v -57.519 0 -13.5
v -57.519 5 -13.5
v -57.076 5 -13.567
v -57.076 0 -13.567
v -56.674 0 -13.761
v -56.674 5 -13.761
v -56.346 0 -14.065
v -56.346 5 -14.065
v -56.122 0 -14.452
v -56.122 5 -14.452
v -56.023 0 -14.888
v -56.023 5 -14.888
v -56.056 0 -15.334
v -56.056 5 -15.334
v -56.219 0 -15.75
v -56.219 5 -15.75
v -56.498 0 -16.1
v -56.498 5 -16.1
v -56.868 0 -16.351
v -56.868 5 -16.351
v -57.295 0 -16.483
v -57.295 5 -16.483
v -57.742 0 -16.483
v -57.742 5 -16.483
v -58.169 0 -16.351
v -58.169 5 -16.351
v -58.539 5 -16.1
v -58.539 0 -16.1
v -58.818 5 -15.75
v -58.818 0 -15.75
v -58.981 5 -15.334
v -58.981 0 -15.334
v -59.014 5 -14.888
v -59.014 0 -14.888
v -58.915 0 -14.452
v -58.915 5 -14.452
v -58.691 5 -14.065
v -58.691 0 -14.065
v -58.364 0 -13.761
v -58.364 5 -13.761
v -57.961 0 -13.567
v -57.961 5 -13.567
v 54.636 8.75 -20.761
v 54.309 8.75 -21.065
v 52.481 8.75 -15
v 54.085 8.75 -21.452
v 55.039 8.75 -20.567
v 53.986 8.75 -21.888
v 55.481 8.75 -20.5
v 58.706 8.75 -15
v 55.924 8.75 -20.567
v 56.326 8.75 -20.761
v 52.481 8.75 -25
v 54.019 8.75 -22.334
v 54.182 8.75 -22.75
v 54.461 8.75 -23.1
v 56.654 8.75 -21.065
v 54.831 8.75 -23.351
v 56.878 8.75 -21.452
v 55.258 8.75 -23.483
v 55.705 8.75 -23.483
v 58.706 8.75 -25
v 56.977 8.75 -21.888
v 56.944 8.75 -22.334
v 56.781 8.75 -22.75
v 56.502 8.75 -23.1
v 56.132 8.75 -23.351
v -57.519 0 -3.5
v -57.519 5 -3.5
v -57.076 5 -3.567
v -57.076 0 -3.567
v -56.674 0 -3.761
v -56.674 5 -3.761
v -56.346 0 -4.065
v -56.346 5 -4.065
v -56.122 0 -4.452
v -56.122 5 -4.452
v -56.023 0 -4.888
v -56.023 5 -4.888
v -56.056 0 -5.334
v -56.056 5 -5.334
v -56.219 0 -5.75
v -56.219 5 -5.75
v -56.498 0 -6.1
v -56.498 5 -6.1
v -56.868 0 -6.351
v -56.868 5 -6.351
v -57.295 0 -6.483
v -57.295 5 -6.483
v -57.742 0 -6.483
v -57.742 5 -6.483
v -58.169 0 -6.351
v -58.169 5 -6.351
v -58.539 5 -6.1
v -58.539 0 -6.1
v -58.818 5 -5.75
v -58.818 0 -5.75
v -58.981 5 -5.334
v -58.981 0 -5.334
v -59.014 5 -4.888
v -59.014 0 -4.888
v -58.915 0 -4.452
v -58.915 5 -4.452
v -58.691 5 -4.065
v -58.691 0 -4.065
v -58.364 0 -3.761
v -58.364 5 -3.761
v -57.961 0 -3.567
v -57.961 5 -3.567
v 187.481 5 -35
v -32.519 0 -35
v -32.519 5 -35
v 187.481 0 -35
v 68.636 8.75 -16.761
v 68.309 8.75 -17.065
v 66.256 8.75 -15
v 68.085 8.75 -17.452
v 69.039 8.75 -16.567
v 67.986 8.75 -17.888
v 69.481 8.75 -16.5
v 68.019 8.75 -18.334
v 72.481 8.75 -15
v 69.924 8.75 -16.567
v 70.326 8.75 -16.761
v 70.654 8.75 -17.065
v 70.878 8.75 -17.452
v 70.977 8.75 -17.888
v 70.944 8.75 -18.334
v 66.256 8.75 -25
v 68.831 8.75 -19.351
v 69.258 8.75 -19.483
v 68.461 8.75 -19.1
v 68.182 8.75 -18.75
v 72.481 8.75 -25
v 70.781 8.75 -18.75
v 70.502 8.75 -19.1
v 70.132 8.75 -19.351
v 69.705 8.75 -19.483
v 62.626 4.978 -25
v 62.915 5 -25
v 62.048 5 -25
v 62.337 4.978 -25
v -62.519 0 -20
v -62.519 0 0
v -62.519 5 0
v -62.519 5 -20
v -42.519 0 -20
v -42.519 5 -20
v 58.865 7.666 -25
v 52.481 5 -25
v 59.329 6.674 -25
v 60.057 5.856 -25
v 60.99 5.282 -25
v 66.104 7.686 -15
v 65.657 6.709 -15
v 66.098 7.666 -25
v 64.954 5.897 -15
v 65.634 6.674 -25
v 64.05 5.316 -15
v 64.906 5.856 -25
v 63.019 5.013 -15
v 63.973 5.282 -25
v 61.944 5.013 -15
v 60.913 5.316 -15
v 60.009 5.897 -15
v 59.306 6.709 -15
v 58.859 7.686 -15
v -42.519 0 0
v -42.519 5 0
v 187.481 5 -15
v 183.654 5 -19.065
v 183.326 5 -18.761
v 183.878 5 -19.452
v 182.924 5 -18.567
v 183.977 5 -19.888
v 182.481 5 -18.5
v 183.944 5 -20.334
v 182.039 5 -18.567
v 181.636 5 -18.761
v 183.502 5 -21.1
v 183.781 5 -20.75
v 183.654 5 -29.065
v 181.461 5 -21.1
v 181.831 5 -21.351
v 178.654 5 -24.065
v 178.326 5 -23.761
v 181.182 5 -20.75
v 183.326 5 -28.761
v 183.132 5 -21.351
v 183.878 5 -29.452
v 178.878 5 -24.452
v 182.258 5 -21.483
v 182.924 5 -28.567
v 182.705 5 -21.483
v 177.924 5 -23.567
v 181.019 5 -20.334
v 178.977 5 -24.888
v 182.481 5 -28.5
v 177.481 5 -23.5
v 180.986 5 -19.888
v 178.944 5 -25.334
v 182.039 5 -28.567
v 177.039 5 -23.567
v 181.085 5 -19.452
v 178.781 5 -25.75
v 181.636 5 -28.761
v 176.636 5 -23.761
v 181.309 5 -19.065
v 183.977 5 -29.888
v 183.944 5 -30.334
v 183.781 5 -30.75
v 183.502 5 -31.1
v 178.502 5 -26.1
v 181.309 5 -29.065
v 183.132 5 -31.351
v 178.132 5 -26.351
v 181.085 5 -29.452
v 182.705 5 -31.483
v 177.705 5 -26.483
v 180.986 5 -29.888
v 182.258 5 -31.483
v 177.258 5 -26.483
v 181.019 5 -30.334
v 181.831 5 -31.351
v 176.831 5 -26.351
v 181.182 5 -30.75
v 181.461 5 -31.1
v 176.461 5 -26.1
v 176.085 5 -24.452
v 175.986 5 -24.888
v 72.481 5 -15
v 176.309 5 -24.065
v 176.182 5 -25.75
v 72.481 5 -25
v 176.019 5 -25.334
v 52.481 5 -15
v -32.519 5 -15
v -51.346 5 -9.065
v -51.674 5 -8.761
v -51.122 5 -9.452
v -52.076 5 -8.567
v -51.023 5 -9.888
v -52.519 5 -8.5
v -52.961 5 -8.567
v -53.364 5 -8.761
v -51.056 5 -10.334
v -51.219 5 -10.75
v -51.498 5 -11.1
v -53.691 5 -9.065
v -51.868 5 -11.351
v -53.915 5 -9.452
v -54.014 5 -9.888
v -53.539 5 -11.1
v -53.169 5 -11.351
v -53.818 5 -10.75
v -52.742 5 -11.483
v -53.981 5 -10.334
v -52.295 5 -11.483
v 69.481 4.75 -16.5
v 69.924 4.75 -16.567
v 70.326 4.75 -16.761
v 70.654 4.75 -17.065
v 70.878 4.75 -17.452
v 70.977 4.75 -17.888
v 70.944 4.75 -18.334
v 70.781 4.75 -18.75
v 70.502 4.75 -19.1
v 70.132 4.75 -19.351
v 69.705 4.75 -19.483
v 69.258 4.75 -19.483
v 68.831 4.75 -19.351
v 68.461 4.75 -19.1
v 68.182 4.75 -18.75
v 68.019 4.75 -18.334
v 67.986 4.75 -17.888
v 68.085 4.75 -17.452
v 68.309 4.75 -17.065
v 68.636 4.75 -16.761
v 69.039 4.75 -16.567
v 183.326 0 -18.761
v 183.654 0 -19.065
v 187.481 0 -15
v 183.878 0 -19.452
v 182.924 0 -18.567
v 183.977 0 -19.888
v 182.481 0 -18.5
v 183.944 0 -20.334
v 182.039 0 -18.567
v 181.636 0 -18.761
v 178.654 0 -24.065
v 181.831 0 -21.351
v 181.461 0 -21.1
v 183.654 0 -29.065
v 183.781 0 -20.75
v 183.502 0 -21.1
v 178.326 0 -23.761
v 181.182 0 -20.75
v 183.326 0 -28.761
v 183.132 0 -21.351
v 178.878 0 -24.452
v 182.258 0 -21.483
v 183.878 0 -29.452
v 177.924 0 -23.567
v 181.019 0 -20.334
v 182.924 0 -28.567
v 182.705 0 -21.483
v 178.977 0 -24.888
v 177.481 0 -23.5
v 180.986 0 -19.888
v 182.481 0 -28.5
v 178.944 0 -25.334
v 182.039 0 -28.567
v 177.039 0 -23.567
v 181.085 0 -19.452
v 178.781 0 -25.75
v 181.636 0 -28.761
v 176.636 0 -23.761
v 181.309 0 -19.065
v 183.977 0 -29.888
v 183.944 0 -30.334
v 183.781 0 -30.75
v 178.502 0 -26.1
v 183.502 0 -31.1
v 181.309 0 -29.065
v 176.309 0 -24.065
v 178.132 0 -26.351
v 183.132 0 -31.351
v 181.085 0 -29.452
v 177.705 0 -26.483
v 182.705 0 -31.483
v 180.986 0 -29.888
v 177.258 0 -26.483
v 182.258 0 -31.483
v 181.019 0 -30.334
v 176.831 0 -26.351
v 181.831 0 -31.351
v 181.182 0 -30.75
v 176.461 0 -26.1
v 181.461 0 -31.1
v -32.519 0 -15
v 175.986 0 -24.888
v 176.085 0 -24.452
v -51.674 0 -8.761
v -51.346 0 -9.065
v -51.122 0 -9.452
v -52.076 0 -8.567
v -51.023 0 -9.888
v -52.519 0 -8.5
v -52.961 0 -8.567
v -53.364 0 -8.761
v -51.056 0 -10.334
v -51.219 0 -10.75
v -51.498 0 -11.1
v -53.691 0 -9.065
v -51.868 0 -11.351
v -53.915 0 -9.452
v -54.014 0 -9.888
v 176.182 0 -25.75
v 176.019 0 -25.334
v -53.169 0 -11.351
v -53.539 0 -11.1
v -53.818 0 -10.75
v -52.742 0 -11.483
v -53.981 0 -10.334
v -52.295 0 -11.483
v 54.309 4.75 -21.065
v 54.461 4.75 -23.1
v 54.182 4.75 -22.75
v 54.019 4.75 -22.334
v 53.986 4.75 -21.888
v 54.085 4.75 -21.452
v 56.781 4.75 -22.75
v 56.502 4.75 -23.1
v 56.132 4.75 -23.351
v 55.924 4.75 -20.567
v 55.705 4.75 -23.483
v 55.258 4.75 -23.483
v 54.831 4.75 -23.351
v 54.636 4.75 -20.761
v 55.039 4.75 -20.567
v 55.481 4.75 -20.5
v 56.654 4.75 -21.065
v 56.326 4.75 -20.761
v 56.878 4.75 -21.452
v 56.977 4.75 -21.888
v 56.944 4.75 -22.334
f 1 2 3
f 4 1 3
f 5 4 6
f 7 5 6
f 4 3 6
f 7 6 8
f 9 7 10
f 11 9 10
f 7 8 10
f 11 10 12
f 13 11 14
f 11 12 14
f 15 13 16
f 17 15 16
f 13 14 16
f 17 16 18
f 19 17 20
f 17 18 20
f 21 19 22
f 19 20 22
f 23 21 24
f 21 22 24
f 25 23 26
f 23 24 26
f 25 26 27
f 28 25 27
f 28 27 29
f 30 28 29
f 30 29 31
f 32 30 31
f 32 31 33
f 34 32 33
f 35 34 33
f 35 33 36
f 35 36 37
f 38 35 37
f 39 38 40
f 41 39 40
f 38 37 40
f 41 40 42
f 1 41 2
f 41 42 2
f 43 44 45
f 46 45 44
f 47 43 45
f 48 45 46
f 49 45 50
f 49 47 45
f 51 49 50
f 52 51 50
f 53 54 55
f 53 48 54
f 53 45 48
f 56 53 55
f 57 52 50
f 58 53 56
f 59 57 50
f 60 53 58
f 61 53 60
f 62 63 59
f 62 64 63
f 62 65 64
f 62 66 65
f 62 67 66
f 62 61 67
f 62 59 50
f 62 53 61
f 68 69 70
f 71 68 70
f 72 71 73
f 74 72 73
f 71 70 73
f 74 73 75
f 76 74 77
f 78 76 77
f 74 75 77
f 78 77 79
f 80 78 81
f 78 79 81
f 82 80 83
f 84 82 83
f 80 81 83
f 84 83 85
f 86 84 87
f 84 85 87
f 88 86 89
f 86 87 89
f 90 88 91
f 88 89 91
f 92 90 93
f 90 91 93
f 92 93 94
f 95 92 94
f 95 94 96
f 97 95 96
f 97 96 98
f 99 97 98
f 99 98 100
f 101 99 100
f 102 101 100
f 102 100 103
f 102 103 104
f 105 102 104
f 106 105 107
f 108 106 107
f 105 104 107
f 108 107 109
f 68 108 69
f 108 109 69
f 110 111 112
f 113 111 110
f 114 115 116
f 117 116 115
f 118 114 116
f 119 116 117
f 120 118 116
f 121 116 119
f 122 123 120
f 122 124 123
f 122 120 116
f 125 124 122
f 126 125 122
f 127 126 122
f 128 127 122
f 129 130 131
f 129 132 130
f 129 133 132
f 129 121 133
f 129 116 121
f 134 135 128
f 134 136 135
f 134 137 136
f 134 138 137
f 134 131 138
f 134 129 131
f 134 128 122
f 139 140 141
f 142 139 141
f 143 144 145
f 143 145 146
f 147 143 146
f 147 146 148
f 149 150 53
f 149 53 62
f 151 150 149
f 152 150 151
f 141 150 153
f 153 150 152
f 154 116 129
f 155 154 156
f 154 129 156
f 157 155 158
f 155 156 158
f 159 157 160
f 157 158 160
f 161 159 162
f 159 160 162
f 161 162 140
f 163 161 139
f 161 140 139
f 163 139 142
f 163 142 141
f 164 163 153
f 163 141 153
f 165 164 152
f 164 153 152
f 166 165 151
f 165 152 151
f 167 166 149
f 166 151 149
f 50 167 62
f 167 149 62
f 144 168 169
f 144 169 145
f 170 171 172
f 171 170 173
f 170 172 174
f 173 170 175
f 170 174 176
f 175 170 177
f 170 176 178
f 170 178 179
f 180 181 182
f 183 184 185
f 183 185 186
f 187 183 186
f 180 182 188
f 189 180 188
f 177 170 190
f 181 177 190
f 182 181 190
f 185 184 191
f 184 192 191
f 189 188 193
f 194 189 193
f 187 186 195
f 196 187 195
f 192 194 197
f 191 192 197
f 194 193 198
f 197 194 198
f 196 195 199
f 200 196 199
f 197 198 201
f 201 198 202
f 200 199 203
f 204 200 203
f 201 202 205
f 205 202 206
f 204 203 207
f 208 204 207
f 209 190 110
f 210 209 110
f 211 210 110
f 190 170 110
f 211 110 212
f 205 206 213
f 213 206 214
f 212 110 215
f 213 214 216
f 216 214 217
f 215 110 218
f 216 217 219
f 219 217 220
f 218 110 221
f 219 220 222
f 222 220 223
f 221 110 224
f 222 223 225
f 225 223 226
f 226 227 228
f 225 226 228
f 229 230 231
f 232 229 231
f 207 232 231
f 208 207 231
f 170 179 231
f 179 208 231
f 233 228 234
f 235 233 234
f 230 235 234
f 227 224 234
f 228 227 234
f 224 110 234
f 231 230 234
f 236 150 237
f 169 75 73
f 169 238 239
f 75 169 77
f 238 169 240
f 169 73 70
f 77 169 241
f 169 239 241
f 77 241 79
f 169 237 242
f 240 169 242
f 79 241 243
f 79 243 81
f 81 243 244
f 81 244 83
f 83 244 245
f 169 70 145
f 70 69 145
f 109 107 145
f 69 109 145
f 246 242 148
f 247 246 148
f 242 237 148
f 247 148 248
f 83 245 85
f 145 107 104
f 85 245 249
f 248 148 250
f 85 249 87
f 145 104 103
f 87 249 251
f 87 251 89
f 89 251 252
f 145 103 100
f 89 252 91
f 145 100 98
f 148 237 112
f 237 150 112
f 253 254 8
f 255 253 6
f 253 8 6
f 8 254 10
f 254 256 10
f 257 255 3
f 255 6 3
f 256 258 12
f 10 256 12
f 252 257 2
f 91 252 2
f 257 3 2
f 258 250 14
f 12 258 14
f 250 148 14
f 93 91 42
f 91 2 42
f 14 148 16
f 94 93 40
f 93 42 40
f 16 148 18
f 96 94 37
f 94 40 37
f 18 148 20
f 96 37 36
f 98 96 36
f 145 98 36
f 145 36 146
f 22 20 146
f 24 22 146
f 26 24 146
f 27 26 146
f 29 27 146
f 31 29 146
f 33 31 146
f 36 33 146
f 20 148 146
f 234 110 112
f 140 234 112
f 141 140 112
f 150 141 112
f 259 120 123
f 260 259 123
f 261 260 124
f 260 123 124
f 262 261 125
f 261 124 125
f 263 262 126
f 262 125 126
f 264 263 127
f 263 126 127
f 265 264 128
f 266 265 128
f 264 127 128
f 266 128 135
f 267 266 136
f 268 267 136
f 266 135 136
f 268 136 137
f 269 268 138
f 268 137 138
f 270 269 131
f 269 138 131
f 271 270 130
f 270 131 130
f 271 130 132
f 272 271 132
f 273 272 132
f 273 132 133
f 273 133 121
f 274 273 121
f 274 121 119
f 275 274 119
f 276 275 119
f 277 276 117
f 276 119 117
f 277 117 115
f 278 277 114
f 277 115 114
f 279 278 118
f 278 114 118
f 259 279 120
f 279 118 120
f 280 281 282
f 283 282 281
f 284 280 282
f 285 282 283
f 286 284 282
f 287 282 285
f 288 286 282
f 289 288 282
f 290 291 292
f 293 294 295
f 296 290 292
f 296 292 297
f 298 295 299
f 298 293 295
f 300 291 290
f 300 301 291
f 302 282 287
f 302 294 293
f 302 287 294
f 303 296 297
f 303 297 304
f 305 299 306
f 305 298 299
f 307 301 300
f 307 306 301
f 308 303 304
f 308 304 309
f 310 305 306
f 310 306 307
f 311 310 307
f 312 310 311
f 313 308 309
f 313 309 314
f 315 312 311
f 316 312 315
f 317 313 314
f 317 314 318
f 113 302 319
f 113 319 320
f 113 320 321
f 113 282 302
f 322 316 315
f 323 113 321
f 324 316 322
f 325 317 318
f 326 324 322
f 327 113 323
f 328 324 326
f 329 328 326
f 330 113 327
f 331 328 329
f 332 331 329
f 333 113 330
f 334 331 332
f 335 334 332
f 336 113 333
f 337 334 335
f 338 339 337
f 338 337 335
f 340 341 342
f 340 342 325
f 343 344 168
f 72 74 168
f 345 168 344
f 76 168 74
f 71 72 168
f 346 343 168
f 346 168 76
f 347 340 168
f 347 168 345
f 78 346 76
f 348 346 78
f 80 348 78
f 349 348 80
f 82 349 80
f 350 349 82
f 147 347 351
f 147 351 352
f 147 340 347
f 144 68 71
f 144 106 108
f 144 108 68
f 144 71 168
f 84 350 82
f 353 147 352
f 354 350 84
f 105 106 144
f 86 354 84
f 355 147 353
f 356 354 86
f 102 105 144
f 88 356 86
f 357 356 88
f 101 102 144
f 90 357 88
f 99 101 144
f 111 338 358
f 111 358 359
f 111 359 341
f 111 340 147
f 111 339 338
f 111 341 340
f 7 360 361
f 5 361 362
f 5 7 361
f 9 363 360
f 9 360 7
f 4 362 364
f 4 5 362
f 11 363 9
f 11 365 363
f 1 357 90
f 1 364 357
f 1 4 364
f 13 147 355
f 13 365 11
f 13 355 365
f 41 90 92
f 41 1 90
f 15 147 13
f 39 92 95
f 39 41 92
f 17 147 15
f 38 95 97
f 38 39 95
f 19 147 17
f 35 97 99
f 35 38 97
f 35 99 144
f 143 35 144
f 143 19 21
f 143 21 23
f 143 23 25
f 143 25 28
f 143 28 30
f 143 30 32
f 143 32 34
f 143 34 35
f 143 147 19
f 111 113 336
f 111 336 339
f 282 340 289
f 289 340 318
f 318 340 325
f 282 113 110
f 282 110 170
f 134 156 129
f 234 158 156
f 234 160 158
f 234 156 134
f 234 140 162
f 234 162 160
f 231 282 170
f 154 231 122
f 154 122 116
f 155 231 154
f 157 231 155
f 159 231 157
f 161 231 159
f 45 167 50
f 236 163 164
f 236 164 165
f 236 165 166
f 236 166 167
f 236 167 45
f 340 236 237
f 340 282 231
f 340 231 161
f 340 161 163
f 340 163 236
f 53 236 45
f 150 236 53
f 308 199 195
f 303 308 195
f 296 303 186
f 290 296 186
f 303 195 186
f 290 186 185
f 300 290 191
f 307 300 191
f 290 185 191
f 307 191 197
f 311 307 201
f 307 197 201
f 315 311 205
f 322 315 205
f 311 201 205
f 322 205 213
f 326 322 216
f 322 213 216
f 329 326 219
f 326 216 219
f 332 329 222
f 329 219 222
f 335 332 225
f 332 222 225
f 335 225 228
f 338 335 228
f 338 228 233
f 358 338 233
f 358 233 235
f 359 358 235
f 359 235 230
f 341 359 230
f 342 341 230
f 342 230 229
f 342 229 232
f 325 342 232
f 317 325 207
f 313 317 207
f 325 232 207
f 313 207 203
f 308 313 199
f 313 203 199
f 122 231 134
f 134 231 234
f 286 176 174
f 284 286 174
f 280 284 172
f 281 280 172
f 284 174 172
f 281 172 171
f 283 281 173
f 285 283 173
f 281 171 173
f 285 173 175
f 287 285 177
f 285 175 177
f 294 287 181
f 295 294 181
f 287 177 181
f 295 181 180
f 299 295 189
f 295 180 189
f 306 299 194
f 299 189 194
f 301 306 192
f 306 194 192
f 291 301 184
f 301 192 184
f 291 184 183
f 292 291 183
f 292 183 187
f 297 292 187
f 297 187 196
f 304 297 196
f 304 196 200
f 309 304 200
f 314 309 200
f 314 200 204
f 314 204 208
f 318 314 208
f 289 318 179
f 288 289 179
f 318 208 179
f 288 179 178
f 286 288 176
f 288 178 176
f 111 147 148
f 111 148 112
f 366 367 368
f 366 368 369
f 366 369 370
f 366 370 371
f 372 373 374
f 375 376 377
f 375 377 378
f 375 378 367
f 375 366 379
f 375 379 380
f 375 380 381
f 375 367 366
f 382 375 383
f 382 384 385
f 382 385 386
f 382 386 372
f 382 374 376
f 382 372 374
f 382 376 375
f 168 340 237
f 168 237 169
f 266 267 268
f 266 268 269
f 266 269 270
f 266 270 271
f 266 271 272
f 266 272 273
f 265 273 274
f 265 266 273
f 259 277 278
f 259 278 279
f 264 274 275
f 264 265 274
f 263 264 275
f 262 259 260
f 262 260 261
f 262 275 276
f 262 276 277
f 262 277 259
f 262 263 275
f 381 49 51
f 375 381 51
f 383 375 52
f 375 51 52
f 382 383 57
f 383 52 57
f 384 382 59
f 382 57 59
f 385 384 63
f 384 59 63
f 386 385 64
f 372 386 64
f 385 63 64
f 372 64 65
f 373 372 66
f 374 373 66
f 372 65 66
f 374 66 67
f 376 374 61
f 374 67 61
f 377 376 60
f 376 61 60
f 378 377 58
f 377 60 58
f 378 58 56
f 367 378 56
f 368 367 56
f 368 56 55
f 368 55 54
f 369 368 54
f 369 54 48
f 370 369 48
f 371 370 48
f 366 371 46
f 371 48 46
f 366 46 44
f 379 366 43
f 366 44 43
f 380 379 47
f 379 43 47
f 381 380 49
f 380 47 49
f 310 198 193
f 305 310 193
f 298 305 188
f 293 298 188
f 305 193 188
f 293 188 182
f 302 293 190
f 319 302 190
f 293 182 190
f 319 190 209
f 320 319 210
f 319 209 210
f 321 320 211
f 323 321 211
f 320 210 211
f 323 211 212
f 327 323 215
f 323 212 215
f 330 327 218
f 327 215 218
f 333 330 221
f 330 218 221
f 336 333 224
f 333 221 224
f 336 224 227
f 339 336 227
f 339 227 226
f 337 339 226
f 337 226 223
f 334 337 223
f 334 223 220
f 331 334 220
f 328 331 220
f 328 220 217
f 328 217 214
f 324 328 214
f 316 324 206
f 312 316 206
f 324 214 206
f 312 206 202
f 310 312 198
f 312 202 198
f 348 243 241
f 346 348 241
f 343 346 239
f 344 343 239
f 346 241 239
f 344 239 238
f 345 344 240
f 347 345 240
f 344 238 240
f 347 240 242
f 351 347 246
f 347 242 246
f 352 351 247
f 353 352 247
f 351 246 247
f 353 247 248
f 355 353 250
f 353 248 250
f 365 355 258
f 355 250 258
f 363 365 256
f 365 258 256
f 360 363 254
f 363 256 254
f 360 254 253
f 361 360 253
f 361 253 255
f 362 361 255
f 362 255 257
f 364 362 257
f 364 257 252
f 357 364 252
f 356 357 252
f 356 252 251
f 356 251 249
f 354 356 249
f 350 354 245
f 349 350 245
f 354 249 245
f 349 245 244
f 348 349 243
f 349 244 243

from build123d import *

# Parameters (mm, degrees)
BOSS_EXTRUDE1_DEPTH = 5
SKETCH2_W           = 20
SKETCH2_H           = 10
BOSS_EXTRUDE2_DEPTH = 3.75
SKETCH3_R           = 3.775
CUT_EXTRUDE1_DEPTH  = 10
SKETCH4_R           = 1.5
CUT_EXTRUDE2_DEPTH  = 5
SKETCH5_R           = 1.5
CUT_EXTRUDE3_DEPTH  = 4


with BuildPart() as part:
    # Sketch1 → Boss-Extrude1 (new body)
    with BuildSketch(Plane(origin=(0, 0, 0), x_dir=(1, 0, 0), z_dir=(0, 1, 0))):
        Polygon((-32.518521424, 35), (187.481478576, 35), (187.481478576, 15), (-32.518521424, 15), (-42.518521424, 0), (-62.518521424, 0), (-62.518521424, 20), (-42.518521424, 20), align=None)
    extrude(amount=BOSS_EXTRUDE1_DEPTH)

    # Sketch2 → Boss-Extrude2 (add)
    with BuildSketch(Plane(origin=(0, 5, 0), x_dir=(1, 0, 0), z_dir=(0, 1, 0))):
        with Locations((62.481478576, 20)):
            Rectangle(SKETCH2_W, SKETCH2_H)
    extrude(amount=BOSS_EXTRUDE2_DEPTH)

    # Sketch3 → Cut-Extrude1 (cut)
    with BuildSketch(Plane(origin=(0, 0, -25), x_dir=(-1, 0, 0), z_dir=(0, 0, -1))):
        with Locations((-62.481478576, 8.75)):
            Circle(SKETCH3_R)
    extrude(amount=-CUT_EXTRUDE1_DEPTH, mode=Mode.SUBTRACT)

    # Sketch4 → Cut-Extrude2 (cut)
    with BuildSketch(Plane(origin=(0, 5, 0), x_dir=(1, 0, 0), z_dir=(0, 1, 0))):
        with Locations(Location((182.481478576, 20, 0), (0, 0, 270))):
            Circle(SKETCH4_R)
        with Locations(Location((177.481478576, 25, 0), (0, 0, 270))):
            Circle(SKETCH4_R)
        with Locations(Location((182.481478576, 30, 0), (0, 0, 270))):
            Circle(SKETCH4_R)
        with Locations(Location((-57.518521424, 5, 0), (0, 0, 270))):
            Circle(SKETCH4_R)
        with Locations(Location((-57.518521424, 15, 0), (0, 0, 270))):
            Circle(SKETCH4_R)
        with Locations(Location((-52.518521424, 10, 0), (0, 0, 270))):
            Circle(SKETCH4_R)
    extrude(amount=-CUT_EXTRUDE2_DEPTH, mode=Mode.SUBTRACT)

    # Sketch5 → Cut-Extrude3 (cut)
    with BuildSketch(Plane(origin=(0, 8.75, 0), x_dir=(1, 0, 0), z_dir=(0, 1, 0))):
        with Locations(Location((55.481478576, 22, 0), (0, 0, 270))):
            Circle(SKETCH5_R)
        with Locations(Location((69.481478576, 18, 0), (0, 0, 270))):
            Circle(SKETCH5_R)
    extrude(amount=-CUT_EXTRUDE3_DEPTH, mode=Mode.SUBTRACT)


solid = part.part
